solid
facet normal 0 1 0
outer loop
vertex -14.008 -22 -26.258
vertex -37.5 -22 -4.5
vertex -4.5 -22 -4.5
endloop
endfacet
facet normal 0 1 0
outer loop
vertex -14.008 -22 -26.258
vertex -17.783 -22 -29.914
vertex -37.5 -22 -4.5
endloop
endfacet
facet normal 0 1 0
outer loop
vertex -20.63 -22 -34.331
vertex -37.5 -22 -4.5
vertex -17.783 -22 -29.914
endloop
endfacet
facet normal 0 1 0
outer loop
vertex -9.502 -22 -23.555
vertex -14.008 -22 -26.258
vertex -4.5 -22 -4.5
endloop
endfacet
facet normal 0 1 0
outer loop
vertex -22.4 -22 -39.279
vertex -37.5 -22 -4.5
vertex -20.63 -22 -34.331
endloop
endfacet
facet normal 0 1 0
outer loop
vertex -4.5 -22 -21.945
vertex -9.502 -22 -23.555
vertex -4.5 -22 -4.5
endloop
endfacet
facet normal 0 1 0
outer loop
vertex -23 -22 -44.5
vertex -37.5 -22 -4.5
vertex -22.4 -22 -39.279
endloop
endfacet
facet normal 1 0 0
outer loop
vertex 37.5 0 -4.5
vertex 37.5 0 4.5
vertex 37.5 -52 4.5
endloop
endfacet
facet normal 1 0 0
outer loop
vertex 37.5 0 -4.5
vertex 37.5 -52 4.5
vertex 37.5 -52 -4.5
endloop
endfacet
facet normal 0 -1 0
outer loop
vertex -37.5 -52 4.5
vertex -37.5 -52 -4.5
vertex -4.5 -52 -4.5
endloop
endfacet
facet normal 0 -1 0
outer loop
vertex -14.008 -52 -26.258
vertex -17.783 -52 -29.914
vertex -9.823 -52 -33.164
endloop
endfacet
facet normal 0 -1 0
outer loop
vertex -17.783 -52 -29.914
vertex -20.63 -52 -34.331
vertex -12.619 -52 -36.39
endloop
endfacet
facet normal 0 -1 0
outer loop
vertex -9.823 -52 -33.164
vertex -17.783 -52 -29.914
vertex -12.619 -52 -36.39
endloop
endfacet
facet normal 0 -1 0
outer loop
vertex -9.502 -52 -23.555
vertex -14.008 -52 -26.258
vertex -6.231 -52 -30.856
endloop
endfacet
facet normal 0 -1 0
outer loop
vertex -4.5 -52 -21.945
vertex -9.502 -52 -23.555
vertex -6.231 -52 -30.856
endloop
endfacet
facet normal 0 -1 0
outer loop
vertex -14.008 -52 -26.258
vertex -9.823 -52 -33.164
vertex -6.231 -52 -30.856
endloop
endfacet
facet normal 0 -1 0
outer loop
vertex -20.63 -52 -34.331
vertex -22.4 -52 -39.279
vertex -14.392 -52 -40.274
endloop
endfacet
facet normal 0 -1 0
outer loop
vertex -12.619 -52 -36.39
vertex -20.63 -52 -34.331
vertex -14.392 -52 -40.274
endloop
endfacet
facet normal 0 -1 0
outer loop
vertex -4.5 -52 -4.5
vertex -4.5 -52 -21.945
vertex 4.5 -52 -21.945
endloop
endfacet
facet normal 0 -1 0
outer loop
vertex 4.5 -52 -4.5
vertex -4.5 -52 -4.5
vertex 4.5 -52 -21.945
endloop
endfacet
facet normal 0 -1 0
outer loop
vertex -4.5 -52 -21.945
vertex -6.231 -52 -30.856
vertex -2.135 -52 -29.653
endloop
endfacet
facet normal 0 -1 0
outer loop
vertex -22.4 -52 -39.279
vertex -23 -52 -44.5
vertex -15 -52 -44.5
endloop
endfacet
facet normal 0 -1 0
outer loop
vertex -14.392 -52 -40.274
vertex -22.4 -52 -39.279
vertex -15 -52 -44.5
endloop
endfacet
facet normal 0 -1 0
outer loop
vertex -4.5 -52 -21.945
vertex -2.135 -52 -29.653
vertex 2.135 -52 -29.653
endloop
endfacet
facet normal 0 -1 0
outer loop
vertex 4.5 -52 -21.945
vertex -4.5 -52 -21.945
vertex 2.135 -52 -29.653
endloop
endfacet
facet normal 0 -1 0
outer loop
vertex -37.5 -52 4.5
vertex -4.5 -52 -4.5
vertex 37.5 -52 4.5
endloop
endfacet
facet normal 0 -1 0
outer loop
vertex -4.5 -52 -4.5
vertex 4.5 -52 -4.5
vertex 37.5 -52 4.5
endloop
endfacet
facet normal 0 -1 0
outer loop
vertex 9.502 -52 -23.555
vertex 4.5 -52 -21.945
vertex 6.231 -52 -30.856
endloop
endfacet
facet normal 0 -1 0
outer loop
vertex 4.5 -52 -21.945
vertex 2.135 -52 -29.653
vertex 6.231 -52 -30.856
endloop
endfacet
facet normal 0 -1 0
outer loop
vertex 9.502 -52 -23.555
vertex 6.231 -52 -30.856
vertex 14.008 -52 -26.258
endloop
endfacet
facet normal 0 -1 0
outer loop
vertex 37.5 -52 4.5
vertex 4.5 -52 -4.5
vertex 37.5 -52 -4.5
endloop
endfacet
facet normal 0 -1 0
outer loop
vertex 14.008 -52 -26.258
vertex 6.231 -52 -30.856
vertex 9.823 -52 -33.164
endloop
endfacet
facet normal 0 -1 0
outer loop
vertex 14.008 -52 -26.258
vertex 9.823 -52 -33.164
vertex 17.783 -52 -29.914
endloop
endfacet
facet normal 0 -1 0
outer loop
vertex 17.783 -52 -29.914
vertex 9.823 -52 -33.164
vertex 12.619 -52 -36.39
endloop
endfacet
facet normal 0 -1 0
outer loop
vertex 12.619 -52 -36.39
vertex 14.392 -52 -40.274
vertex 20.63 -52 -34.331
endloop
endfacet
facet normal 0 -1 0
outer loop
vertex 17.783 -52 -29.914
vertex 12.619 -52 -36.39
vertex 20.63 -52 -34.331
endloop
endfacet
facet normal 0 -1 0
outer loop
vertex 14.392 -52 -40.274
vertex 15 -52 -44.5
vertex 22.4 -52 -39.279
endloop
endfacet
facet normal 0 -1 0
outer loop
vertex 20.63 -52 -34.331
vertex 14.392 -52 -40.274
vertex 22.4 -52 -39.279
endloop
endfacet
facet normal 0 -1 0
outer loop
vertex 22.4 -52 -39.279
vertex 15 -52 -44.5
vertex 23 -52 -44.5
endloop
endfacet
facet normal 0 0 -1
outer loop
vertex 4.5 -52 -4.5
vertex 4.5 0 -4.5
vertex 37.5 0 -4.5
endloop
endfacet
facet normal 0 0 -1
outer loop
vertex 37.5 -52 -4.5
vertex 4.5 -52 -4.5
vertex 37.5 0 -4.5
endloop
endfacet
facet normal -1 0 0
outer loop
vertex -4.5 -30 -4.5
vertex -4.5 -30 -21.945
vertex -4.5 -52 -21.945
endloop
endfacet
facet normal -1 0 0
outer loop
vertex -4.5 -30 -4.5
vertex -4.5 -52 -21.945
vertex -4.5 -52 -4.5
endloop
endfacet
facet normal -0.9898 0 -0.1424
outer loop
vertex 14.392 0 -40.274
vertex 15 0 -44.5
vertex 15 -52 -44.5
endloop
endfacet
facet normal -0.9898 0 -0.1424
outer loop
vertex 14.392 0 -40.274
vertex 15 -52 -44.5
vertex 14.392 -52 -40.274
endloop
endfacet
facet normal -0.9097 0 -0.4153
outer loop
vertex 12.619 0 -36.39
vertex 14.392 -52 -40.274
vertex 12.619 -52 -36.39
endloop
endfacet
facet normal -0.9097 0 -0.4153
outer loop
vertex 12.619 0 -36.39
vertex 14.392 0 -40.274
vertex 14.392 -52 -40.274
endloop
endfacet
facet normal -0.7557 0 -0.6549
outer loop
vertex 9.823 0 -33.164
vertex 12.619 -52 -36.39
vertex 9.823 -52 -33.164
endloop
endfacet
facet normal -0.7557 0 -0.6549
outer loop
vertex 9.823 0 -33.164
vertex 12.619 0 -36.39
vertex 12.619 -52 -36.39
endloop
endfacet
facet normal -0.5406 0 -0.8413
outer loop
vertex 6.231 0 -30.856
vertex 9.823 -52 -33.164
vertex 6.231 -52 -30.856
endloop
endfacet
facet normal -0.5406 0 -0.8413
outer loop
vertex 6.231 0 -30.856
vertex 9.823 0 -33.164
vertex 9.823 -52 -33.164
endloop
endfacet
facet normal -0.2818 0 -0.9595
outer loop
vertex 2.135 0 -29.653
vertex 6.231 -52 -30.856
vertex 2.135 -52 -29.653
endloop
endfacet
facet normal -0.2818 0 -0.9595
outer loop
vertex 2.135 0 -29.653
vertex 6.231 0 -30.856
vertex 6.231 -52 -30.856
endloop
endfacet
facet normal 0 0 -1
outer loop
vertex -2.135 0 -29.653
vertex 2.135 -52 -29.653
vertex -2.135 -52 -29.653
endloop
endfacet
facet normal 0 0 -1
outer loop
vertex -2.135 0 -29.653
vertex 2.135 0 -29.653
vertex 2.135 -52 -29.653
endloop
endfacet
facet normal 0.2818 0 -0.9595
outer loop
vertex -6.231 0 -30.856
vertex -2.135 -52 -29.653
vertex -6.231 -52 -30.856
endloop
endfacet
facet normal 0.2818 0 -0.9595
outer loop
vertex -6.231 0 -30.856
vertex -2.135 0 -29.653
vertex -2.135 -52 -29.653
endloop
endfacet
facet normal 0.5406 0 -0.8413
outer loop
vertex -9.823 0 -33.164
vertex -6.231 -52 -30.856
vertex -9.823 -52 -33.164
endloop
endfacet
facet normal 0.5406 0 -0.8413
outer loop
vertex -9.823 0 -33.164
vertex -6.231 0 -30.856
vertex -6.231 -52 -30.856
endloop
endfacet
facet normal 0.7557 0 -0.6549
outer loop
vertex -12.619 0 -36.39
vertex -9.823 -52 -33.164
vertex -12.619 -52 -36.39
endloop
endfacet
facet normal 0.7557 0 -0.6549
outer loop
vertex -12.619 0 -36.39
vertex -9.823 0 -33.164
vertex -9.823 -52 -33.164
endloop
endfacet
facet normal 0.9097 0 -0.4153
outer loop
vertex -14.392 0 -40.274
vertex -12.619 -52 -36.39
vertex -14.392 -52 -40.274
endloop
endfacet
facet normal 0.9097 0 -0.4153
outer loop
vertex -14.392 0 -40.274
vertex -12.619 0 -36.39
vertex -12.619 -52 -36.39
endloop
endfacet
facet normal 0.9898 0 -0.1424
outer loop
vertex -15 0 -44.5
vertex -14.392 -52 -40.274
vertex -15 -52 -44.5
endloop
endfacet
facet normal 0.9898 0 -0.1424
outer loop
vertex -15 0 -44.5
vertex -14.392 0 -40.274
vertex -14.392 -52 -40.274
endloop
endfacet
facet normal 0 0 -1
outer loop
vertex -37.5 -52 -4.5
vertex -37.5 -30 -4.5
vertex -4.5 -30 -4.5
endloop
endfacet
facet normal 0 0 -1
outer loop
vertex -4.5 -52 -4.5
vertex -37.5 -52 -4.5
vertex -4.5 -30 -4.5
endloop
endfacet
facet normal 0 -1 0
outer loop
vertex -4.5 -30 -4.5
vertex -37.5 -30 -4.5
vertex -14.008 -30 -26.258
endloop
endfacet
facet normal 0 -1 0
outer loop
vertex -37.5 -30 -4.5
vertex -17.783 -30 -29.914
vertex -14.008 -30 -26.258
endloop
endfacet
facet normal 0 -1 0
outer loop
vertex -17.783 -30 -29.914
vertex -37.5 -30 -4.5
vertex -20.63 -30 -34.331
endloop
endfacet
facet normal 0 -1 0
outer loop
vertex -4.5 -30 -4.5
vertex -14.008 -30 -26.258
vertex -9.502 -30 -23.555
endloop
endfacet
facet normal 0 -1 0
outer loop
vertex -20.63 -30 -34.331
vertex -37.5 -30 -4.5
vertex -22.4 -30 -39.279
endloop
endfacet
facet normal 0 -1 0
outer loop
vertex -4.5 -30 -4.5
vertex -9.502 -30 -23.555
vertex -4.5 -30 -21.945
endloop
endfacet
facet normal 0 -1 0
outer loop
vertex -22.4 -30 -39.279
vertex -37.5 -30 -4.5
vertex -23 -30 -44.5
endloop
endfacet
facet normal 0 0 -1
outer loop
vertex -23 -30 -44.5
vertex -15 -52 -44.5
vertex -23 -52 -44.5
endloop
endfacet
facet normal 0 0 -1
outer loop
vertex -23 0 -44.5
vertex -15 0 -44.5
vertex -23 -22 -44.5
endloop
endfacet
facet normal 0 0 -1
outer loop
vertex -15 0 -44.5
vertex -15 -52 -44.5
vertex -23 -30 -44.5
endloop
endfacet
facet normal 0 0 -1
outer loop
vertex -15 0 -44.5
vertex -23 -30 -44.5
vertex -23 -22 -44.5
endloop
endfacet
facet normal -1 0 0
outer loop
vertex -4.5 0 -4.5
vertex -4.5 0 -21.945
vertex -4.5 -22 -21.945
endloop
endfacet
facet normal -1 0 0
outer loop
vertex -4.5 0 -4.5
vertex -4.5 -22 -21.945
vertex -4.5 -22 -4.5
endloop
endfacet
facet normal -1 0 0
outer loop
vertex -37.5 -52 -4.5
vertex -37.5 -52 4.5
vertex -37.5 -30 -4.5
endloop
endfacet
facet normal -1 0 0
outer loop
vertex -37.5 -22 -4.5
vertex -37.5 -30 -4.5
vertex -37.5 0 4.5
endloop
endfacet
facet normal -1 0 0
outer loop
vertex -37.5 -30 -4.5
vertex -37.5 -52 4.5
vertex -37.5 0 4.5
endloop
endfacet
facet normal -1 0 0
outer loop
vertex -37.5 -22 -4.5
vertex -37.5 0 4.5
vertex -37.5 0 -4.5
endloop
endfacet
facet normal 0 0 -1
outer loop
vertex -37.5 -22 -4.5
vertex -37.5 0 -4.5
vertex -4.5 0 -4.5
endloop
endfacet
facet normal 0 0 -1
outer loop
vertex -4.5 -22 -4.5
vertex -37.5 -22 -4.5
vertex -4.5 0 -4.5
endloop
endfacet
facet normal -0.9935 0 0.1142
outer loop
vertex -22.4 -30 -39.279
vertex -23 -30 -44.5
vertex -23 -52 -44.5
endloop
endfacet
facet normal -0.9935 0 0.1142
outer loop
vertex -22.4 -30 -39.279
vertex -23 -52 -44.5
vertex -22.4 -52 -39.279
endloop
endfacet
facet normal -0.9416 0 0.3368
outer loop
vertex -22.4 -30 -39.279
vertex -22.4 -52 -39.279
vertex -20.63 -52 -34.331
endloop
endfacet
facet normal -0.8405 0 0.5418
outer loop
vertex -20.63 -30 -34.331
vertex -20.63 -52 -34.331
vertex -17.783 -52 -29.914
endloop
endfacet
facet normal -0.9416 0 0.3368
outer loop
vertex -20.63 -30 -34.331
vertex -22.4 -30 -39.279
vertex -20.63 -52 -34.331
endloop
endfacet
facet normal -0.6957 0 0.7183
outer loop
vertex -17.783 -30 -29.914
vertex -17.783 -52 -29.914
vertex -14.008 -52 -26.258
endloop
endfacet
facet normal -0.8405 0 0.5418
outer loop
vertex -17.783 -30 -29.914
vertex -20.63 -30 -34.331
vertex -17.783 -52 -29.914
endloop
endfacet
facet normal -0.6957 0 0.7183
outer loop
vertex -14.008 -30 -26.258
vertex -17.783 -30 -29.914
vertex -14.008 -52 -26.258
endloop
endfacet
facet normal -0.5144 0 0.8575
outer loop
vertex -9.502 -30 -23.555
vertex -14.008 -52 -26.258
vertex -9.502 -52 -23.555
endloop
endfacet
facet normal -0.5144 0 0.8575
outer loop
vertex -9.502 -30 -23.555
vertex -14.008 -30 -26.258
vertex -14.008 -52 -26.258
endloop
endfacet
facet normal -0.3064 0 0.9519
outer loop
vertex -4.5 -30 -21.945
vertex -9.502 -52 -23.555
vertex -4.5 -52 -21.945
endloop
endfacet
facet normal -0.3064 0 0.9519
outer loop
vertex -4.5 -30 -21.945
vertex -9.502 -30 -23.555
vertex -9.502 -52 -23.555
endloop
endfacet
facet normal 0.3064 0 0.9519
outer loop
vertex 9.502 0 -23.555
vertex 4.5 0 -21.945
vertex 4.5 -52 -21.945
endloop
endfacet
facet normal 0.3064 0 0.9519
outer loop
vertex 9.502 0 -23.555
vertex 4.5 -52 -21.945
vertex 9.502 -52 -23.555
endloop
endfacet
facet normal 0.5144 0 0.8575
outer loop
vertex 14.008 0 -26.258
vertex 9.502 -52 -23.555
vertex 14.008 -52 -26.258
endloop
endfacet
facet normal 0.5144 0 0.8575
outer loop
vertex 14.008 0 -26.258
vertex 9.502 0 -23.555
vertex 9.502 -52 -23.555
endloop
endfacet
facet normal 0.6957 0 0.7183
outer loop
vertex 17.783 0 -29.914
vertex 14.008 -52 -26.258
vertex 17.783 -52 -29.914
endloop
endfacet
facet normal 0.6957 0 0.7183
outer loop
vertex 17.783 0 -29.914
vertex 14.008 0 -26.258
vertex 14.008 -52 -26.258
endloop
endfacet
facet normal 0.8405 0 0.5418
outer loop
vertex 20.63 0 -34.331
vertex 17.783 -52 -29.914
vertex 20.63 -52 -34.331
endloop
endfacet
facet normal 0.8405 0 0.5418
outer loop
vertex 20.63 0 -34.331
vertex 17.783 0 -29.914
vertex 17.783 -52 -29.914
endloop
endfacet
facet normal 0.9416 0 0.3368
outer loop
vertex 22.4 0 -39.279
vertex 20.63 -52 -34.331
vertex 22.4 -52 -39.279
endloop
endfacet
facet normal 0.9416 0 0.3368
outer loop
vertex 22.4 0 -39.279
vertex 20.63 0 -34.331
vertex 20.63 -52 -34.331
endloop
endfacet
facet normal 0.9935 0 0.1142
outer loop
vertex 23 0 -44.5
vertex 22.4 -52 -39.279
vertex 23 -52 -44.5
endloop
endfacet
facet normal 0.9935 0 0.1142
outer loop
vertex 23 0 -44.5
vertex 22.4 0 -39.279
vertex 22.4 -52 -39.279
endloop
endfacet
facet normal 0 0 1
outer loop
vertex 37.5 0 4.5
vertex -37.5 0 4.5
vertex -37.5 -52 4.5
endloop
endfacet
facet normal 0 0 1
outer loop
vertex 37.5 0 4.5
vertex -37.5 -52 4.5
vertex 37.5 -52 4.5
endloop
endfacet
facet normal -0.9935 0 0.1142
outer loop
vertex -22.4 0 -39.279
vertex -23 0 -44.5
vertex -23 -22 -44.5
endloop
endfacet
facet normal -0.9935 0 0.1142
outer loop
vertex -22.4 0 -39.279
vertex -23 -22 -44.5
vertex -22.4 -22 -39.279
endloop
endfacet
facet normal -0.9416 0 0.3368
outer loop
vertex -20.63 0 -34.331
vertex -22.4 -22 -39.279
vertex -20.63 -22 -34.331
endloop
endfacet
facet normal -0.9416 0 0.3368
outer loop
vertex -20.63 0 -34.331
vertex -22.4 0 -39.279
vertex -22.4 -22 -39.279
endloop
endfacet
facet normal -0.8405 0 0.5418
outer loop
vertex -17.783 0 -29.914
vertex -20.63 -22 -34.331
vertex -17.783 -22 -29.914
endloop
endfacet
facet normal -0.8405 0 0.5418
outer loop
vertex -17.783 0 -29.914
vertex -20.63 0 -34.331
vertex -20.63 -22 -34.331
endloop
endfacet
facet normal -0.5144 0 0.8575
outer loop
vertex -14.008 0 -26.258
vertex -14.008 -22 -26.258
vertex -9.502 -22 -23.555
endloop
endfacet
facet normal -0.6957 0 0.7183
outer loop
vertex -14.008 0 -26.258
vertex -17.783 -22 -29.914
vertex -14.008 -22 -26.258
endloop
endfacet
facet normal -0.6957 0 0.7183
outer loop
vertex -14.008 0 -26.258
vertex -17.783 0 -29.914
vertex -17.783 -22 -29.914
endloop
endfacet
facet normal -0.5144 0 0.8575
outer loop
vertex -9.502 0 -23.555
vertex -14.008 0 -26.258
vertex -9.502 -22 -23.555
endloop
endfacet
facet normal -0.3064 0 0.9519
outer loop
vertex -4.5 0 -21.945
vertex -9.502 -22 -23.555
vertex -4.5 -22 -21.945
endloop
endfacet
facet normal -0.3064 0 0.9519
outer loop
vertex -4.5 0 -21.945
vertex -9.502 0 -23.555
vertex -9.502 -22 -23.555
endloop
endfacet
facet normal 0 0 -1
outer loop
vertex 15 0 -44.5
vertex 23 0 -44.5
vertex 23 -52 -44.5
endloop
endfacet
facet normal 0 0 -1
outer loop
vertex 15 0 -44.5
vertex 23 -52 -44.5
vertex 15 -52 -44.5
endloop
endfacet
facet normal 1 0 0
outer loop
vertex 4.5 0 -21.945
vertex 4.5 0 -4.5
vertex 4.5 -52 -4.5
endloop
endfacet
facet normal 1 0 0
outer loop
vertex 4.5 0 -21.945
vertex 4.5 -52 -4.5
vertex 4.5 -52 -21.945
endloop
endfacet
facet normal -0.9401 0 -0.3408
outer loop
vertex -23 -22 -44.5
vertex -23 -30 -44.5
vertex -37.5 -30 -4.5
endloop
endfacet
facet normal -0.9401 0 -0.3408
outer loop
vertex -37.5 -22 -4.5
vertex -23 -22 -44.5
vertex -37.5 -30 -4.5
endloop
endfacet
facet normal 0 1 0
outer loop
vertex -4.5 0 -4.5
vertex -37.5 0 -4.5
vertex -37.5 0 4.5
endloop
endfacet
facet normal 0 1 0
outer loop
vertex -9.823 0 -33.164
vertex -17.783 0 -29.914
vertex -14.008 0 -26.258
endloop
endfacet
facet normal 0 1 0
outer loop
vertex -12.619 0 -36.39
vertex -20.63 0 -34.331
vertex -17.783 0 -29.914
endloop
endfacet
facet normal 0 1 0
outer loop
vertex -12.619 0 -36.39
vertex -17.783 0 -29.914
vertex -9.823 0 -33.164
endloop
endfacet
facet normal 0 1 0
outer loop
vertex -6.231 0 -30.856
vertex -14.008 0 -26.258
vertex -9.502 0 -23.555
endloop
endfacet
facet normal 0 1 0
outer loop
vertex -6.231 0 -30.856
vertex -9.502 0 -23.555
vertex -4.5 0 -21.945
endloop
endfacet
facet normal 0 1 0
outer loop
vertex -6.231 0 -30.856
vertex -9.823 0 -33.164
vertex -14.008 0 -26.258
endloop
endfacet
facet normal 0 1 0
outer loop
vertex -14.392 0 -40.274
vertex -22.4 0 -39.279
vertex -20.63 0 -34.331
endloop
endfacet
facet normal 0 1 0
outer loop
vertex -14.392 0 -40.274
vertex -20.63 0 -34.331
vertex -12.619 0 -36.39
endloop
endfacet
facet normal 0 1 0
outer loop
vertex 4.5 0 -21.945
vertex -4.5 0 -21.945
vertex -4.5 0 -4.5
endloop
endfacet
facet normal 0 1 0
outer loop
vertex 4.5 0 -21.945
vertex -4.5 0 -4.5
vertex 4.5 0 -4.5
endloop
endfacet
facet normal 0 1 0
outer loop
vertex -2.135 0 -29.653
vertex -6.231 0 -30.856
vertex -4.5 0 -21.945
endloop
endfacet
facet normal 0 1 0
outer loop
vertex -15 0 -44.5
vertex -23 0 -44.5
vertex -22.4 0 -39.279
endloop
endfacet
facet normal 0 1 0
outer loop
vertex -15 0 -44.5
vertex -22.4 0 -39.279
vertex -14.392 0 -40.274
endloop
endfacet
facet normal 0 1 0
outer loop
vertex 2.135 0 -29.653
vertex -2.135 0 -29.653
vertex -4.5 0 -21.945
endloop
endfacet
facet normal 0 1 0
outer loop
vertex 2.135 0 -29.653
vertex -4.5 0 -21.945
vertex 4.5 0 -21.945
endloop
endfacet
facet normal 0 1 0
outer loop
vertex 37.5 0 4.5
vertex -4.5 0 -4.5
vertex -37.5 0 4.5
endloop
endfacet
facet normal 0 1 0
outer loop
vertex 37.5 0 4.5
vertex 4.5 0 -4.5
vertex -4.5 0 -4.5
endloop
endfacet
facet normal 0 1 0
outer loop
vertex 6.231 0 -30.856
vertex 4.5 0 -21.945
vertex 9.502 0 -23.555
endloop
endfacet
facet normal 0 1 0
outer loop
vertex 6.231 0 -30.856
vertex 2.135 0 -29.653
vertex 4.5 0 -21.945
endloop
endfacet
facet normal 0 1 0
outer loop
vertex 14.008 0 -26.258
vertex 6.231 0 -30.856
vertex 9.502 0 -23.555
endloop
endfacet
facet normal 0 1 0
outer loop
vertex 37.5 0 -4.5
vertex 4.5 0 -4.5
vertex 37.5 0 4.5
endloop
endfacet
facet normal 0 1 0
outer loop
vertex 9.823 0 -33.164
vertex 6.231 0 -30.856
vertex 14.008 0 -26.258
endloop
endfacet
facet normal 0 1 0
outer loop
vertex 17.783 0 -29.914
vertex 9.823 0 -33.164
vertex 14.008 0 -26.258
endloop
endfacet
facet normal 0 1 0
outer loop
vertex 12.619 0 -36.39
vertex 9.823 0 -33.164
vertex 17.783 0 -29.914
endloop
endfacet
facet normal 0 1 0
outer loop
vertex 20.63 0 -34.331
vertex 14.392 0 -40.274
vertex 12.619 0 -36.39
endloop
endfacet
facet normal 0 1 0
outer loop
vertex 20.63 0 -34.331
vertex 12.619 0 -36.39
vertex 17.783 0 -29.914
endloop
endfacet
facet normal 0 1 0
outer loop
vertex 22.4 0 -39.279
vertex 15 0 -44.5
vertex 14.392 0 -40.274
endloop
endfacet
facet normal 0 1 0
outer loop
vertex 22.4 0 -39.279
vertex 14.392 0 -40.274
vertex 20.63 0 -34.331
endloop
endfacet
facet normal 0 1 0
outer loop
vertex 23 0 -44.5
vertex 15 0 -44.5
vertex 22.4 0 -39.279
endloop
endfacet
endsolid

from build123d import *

# Parameters (mm, degrees)
SKETCH8_W           = 75
SKETCH8_H           = 9
BOSS_EXTRUDE5_DEPTH = 52
BOSS_EXTRUDE6_DEPTH = 8


with BuildPart() as part:
    # Sketch8 → Boss-Extrude5 (new body)
    with BuildSketch(Plane(origin=(0, 0, 0), x_dir=(1, 0, 0), z_dir=(0, 1, 0))):
        with BuildLine():
            Line((-4.5, 21.5), (-4.5, 4.5))
            Line((-4.5, 4.5), (4.5, 4.5))
            Line((4.5, 4.5), (4.5, 21.5))
            Line((4.5, 21.5), (4.5, 21.944512863))
            ThreePointArc((4.5, 21.944512863), (17.783419244, 29.914047854), (23, 44.5))
            Line((23, 44.5), (15, 44.5))
            ThreePointArc((15, 44.5), (0, 29.5), (-15, 44.5))
            Line((-15, 44.5), (-23, 44.5))
            ThreePointArc((-23, 44.5), (-17.783419244, 29.914047854), (-4.5, 21.944512863))
            Line((-4.5, 21.944512863), (-4.5, 21.5))
        make_face()
        Rectangle(SKETCH8_W, SKETCH8_H)
    extrude(amount=-BOSS_EXTRUDE5_DEPTH)

    # Sketch9 → Boss-Extrude6 (add)
    with BuildSketch(Plane(origin=(0, -30, 0), x_dir=(-1, 0, 0), z_dir=(0, -1, 0))):
        with BuildLine():
            Line((23, 44.5), (37.5, 4.5))
            Line((37.5, 4.5), (4.5, 4.5))
            Line((4.5, 4.5), (4.5, 21.944512863))
            ThreePointArc((4.5, 21.944512863), (17.783419244, 29.914047854), (23, 44.5))
        make_face()
    extrude(amount=-BOSS_EXTRUDE6_DEPTH)


solid = part.part
